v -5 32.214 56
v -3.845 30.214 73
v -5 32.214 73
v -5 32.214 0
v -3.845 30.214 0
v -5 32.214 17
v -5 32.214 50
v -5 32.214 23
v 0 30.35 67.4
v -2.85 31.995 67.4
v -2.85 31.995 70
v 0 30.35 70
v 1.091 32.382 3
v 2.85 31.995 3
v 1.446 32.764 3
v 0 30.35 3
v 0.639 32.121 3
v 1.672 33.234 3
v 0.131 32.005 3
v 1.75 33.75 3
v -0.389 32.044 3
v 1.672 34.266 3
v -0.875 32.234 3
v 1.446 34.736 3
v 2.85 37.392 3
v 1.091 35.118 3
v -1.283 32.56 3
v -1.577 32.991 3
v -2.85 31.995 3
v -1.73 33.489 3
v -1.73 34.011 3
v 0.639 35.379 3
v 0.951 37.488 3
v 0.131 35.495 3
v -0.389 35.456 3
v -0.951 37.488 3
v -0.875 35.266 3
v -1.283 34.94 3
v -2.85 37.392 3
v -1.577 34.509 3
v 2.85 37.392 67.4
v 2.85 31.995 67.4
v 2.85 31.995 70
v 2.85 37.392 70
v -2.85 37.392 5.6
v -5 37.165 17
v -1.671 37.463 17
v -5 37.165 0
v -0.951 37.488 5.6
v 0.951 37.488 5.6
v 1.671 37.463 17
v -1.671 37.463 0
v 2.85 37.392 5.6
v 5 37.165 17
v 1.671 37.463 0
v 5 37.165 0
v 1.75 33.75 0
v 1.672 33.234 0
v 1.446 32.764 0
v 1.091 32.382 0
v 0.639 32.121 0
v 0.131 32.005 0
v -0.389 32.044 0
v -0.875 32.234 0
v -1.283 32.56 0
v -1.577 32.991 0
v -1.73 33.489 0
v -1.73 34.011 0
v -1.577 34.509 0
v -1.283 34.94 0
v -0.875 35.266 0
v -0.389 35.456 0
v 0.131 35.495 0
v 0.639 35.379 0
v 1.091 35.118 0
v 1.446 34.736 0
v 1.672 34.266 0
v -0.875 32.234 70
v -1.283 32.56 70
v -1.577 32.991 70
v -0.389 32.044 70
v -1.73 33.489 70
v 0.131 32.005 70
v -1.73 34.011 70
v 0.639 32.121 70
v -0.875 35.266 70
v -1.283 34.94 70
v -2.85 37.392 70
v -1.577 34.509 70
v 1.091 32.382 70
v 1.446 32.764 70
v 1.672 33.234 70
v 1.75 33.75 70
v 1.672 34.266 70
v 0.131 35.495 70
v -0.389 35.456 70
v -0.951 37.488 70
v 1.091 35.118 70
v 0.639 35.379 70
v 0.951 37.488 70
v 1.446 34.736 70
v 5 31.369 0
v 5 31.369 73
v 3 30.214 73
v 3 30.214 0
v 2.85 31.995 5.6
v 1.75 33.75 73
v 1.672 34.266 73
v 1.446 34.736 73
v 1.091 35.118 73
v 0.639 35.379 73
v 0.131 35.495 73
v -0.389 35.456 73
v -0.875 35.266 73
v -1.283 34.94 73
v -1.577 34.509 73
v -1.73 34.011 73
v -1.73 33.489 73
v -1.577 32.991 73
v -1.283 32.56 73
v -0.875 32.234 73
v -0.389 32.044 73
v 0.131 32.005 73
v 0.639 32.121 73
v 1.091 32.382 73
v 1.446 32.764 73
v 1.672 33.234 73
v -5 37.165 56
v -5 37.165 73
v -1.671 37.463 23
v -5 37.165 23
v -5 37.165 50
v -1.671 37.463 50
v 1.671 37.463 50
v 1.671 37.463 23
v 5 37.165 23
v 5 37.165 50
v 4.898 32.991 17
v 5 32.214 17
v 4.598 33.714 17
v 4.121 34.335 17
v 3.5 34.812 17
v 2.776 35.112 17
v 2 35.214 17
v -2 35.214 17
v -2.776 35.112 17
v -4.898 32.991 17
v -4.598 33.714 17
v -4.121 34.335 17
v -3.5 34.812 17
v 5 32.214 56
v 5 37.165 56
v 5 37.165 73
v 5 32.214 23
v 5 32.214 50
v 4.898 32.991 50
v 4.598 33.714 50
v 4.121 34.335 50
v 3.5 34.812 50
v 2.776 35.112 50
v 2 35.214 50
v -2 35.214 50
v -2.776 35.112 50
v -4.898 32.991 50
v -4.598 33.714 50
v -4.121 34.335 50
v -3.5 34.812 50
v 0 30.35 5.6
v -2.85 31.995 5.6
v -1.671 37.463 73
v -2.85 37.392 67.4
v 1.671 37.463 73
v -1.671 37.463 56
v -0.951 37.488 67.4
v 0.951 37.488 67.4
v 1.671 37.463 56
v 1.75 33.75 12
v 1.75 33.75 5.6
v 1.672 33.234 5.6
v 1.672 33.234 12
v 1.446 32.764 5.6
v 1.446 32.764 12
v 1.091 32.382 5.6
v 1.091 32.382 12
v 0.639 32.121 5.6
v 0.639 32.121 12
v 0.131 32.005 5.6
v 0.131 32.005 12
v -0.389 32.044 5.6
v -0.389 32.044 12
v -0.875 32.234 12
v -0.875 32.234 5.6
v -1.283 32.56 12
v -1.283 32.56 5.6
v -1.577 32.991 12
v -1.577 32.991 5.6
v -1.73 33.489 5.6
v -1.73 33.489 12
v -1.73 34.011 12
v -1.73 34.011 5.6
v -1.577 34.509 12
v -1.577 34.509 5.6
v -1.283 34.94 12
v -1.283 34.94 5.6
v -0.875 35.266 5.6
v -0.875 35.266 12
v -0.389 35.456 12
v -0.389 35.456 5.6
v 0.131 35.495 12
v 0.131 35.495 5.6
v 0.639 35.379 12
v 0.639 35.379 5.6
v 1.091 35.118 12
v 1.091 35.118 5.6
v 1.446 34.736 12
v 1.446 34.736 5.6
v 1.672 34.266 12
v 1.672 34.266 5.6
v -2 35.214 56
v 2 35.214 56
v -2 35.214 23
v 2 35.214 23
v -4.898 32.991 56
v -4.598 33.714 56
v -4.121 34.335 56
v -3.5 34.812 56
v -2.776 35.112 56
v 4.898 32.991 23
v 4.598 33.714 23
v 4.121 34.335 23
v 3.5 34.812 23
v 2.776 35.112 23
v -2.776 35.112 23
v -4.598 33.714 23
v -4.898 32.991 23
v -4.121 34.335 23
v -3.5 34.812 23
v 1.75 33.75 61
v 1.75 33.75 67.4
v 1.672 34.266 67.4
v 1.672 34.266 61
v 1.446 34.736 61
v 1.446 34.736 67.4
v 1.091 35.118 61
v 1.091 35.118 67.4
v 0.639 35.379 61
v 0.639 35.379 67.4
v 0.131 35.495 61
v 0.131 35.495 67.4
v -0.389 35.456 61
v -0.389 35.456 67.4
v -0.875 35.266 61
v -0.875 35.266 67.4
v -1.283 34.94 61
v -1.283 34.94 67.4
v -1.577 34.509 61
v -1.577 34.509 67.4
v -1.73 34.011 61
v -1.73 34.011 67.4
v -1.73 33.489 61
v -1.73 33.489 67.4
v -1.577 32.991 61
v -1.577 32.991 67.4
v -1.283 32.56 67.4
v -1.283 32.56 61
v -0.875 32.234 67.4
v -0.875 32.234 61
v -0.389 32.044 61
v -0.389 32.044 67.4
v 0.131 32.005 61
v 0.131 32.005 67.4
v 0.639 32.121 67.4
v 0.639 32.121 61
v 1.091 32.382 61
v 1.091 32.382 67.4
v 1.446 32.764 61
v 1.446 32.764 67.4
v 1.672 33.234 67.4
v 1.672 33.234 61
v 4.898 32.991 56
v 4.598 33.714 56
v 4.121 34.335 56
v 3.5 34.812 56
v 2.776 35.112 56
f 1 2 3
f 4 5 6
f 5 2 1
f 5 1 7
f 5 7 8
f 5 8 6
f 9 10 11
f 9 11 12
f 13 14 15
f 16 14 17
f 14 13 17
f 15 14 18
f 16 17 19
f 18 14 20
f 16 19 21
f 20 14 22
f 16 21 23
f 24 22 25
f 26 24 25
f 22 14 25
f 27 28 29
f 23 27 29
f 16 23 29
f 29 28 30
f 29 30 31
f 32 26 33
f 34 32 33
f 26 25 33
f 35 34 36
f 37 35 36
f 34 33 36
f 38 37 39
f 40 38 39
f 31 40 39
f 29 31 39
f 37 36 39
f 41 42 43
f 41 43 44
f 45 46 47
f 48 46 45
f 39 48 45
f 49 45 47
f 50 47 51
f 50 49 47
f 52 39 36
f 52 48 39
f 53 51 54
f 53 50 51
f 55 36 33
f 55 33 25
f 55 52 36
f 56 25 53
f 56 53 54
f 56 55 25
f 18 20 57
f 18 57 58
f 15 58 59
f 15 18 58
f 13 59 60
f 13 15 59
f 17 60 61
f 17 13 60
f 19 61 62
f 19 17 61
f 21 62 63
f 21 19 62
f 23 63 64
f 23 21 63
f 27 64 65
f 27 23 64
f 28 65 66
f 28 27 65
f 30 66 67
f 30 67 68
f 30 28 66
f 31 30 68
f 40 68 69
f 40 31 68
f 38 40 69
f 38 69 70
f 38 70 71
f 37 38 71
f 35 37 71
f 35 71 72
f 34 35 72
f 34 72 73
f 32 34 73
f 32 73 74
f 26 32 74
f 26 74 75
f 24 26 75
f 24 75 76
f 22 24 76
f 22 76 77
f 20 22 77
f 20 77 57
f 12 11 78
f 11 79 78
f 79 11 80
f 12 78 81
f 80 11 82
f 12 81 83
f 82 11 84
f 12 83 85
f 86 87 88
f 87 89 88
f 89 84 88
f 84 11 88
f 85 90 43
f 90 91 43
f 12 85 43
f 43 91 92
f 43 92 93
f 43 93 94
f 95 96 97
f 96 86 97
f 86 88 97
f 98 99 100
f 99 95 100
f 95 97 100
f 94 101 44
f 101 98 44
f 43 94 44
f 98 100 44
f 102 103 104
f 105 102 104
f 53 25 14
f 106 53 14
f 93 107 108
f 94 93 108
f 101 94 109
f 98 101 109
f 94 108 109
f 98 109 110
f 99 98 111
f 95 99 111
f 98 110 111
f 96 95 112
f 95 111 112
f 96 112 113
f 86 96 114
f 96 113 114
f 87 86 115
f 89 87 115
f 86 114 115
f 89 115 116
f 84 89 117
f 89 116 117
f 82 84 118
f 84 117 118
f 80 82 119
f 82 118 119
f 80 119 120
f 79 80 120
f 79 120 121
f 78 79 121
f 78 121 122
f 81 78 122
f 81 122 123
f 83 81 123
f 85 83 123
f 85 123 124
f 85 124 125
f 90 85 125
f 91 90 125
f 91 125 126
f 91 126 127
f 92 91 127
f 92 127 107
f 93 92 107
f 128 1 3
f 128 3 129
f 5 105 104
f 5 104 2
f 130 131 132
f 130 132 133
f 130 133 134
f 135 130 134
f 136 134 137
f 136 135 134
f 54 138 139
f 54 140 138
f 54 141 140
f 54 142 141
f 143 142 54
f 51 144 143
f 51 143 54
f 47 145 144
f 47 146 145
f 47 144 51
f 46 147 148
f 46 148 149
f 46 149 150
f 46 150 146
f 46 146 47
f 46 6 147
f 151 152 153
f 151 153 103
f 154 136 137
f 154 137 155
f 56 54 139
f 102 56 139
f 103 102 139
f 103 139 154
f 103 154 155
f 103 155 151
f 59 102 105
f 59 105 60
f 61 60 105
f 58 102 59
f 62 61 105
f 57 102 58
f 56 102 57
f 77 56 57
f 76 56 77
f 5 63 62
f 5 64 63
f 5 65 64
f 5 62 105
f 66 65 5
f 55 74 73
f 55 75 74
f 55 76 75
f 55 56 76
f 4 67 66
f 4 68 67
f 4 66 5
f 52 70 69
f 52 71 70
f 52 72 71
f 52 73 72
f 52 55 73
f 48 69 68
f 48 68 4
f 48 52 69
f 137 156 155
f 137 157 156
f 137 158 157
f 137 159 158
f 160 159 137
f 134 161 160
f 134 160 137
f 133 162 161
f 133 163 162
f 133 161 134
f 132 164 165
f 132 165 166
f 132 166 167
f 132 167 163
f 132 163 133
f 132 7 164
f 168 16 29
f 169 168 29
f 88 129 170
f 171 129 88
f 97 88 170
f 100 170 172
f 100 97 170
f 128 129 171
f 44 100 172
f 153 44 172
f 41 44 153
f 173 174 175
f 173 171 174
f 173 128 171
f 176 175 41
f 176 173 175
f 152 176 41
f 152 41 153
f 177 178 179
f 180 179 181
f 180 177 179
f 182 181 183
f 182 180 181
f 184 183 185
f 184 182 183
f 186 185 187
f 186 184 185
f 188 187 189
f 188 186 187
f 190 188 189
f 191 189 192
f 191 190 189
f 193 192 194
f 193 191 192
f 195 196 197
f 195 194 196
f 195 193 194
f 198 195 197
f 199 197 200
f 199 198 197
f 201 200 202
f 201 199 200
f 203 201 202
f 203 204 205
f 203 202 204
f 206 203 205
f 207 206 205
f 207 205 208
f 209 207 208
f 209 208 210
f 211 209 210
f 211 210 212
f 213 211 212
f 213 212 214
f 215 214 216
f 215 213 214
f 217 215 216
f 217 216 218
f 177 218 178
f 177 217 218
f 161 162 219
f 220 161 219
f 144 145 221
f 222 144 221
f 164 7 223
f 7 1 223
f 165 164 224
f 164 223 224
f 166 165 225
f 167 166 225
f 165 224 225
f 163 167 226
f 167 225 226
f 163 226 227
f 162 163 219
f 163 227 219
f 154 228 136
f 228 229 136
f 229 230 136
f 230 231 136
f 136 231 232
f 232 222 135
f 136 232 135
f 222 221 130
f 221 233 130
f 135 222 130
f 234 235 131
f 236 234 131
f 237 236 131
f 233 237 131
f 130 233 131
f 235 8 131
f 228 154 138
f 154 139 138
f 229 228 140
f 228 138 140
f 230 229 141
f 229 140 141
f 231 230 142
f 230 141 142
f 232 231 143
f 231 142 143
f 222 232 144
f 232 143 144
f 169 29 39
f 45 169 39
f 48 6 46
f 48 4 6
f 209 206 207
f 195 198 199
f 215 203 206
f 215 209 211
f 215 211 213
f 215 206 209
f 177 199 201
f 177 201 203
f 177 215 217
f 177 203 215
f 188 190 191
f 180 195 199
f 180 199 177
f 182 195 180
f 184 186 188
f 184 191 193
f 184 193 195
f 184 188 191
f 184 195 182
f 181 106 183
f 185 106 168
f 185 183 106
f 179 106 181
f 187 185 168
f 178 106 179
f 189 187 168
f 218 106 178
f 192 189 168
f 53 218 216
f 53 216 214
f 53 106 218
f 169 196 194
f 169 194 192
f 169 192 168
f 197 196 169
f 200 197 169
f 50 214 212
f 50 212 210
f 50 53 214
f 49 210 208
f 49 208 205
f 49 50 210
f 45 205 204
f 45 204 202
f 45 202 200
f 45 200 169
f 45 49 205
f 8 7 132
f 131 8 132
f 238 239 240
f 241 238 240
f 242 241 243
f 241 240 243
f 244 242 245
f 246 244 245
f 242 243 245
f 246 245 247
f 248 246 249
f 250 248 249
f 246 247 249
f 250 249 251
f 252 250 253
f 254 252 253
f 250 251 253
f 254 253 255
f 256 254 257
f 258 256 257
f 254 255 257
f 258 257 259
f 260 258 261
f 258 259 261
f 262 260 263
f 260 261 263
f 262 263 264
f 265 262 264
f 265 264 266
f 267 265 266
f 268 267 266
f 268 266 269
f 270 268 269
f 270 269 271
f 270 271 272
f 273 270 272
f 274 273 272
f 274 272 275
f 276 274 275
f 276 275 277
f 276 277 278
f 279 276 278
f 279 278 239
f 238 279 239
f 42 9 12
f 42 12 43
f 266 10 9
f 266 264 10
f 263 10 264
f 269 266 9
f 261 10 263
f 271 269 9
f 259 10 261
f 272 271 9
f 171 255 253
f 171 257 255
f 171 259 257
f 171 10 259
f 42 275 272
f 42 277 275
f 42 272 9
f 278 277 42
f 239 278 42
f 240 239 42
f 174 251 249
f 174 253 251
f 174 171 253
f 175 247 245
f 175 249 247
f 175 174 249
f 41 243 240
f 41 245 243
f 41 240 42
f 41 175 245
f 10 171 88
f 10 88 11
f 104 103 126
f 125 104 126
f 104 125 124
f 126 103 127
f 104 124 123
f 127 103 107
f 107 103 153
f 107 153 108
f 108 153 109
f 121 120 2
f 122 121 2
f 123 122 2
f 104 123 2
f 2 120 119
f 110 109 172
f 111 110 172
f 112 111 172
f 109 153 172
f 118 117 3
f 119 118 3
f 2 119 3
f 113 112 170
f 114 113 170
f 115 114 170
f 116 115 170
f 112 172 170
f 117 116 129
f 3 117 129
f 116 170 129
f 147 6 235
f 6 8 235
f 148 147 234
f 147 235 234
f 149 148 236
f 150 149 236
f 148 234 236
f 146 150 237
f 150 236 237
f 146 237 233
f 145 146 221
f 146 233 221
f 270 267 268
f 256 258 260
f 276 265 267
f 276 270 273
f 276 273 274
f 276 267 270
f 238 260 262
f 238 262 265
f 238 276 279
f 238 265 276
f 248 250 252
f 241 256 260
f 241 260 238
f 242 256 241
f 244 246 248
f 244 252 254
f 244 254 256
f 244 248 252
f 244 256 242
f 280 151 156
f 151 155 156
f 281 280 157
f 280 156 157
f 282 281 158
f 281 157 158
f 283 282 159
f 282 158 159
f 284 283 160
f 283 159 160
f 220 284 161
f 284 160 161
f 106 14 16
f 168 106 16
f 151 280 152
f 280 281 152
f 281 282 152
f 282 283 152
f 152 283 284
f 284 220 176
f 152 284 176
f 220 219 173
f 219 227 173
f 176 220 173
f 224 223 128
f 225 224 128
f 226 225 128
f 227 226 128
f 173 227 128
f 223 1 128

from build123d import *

# Parameters (mm, degrees)
BOSS_EXTRU_2_DEPTH      = 73
ESQUISSE6_W             = 6
ESQUISSE6_H             = 5
ENL_V_MAT_EXTRU_3_DEPTH = 83.675570757
ESQUISSE7_R             = 1.75
ENL_V_MAT_EXTRU_4_DEPTH = 12
ENL_V_START             = -12
ESQUISSE8_R             = 1.75
ENL_V_MAT_EXTRU_5_DEPTH = 12
CONG_1_R                = 3
ENL_V_START_2           = -3
ENL_V_MAT_EXTRU_6_DEPTH = 2.6
ENL_V_START_3           = -5.6
ENL_V_MAT_EXTRU_7_DEPTH = 2.6
CHANFREIN1_SIZE         = 1.154700538
CHANFREIN1_SIZE_2       = 2


with BuildPart() as part:
    # Esquisse3 → Boss.-Extru.2 (new body)
    with BuildSketch(Plane.XY):
        with BuildLine():
            ThreePointArc((-5, 37.165171868), (0, 37.5), (5, 37.165171868))
            Line((5, 37.165171868), (5, 30.214079913))
            Line((5, 30.214079913), (-5, 30.214079913))
            Line((-5, 30.214079913), (-5, 37.165171868))
        make_face()
    extrude(amount=BOSS_EXTRU_2_DEPTH)

    # Esquisse6 → Enlèv. mat.-Extru.3 (cut, through all)
    with BuildSketch(Plane.ZY.offset(5)):
        with Locations((20, 37.714079913)):
            Rectangle(ESQUISSE6_W, ESQUISSE6_H)
        with Locations((53, 37.714079913)):
            Rectangle(ESQUISSE6_W, ESQUISSE6_H)
    extrude(amount=-ENL_V_MAT_EXTRU_3_DEPTH, mode=Mode.SUBTRACT)

    # Esquisse7 → Enlèv. mat.-Extru.4 (cut)
    with BuildSketch(Plane.XY.offset(73)):
        with Locations((0, 33.75)):
            Circle(ESQUISSE7_R)
    extrude(amount=-ENL_V_MAT_EXTRU_4_DEPTH, mode=Mode.SUBTRACT)

    # Esquisse8 → Enlèv. mat.-Extru.5 (cut)
    with BuildSketch(Plane(origin=(0, 0, 0), x_dir=(-1, 0, 0), z_dir=(0, 0, -1)).offset(ENL_V_START)):
        with Locations(Location((0, 33.75, 0), (0, 0, 180))):
            Circle(ESQUISSE8_R)
    extrude(amount=ENL_V_MAT_EXTRU_5_DEPTH, mode=Mode.SUBTRACT)

    # Congé1
    cong_1_edges = [part.edges().sort_by_distance(p)[0] for p in [
        (5, 35.214079913, 20),
        (-5, 35.214079913, 20),
        (5, 35.214079913, 53),
        (-5, 35.214079913, 53),
    ]]
    fillet(cong_1_edges, radius=CONG_1_R)

    # Esquisse9 → Enlèv. mat.-Extru.6 (cut)
    with BuildSketch(Plane(origin=(0, 0, 0), x_dir=(-1, 0, 0), z_dir=(0, 0, -1)).offset(ENL_V_START_2)):
        with BuildLine():
            Line((-2.85, 37.391543162), (-2.85, 31.995448267))
            Line((-2.85, 31.995448267), (0, 30.35))
            Line((0, 30.35), (2.85, 31.995448267))
            Line((2.85, 31.995448267), (2.85, 37.391543162))
            ThreePointArc((2.85, 37.391543162), (0, 37.5), (-2.85, 37.391543162))
        make_face()
    extrude(amount=-ENL_V_MAT_EXTRU_6_DEPTH, mode=Mode.SUBTRACT)

    # Esquisse10 → Enlèv. mat.-Extru.7 (cut)
    with BuildSketch(Plane.XY.offset(73).offset(ENL_V_START_3)):
        with BuildLine():
            Line((-2.85, 37.391543162), (-2.85, 31.995448267))
            Line((-2.85, 31.995448267), (0, 30.35))
            Line((0, 30.35), (2.85, 31.995448267))
            Line((2.85, 31.995448267), (2.85, 37.391543162))
            ThreePointArc((2.85, 37.391543162), (0, 37.5), (-2.85, 37.391543162))
        make_face()
    extrude(amount=ENL_V_MAT_EXTRU_7_DEPTH, mode=Mode.SUBTRACT)

    # Chanfrein1
    # the kernel refuses this chamfer: 2, 1.154700538 mm, written as the material it takes off along each edge
    with BuildSketch(Plane(origin=(5, 30.214079913, -5.174171509), x_dir=(0.0578938624026711, 0.9983227437537925, 0), z_dir=(0, 0, 1)), Plane(origin=(-5, 30.214079913, -5.174171509), x_dir=(0.9983227437537925, -0.05789386240267115, 0), z_dir=(0, 0, 1))) as chanfrein1_piece_1:
        Polygon((CHANFREIN1_SIZE * 0.998322744082, CHANFREIN1_SIZE * 0.0578938624217), (-CHANFREIN1_SIZE_2 * 0.0578938624027, CHANFREIN1_SIZE_2 * 0.998322743754), (0, 0), align=None)
    extrude(amount=83.348343019, mode=Mode.SUBTRACT)


solid = part.part
